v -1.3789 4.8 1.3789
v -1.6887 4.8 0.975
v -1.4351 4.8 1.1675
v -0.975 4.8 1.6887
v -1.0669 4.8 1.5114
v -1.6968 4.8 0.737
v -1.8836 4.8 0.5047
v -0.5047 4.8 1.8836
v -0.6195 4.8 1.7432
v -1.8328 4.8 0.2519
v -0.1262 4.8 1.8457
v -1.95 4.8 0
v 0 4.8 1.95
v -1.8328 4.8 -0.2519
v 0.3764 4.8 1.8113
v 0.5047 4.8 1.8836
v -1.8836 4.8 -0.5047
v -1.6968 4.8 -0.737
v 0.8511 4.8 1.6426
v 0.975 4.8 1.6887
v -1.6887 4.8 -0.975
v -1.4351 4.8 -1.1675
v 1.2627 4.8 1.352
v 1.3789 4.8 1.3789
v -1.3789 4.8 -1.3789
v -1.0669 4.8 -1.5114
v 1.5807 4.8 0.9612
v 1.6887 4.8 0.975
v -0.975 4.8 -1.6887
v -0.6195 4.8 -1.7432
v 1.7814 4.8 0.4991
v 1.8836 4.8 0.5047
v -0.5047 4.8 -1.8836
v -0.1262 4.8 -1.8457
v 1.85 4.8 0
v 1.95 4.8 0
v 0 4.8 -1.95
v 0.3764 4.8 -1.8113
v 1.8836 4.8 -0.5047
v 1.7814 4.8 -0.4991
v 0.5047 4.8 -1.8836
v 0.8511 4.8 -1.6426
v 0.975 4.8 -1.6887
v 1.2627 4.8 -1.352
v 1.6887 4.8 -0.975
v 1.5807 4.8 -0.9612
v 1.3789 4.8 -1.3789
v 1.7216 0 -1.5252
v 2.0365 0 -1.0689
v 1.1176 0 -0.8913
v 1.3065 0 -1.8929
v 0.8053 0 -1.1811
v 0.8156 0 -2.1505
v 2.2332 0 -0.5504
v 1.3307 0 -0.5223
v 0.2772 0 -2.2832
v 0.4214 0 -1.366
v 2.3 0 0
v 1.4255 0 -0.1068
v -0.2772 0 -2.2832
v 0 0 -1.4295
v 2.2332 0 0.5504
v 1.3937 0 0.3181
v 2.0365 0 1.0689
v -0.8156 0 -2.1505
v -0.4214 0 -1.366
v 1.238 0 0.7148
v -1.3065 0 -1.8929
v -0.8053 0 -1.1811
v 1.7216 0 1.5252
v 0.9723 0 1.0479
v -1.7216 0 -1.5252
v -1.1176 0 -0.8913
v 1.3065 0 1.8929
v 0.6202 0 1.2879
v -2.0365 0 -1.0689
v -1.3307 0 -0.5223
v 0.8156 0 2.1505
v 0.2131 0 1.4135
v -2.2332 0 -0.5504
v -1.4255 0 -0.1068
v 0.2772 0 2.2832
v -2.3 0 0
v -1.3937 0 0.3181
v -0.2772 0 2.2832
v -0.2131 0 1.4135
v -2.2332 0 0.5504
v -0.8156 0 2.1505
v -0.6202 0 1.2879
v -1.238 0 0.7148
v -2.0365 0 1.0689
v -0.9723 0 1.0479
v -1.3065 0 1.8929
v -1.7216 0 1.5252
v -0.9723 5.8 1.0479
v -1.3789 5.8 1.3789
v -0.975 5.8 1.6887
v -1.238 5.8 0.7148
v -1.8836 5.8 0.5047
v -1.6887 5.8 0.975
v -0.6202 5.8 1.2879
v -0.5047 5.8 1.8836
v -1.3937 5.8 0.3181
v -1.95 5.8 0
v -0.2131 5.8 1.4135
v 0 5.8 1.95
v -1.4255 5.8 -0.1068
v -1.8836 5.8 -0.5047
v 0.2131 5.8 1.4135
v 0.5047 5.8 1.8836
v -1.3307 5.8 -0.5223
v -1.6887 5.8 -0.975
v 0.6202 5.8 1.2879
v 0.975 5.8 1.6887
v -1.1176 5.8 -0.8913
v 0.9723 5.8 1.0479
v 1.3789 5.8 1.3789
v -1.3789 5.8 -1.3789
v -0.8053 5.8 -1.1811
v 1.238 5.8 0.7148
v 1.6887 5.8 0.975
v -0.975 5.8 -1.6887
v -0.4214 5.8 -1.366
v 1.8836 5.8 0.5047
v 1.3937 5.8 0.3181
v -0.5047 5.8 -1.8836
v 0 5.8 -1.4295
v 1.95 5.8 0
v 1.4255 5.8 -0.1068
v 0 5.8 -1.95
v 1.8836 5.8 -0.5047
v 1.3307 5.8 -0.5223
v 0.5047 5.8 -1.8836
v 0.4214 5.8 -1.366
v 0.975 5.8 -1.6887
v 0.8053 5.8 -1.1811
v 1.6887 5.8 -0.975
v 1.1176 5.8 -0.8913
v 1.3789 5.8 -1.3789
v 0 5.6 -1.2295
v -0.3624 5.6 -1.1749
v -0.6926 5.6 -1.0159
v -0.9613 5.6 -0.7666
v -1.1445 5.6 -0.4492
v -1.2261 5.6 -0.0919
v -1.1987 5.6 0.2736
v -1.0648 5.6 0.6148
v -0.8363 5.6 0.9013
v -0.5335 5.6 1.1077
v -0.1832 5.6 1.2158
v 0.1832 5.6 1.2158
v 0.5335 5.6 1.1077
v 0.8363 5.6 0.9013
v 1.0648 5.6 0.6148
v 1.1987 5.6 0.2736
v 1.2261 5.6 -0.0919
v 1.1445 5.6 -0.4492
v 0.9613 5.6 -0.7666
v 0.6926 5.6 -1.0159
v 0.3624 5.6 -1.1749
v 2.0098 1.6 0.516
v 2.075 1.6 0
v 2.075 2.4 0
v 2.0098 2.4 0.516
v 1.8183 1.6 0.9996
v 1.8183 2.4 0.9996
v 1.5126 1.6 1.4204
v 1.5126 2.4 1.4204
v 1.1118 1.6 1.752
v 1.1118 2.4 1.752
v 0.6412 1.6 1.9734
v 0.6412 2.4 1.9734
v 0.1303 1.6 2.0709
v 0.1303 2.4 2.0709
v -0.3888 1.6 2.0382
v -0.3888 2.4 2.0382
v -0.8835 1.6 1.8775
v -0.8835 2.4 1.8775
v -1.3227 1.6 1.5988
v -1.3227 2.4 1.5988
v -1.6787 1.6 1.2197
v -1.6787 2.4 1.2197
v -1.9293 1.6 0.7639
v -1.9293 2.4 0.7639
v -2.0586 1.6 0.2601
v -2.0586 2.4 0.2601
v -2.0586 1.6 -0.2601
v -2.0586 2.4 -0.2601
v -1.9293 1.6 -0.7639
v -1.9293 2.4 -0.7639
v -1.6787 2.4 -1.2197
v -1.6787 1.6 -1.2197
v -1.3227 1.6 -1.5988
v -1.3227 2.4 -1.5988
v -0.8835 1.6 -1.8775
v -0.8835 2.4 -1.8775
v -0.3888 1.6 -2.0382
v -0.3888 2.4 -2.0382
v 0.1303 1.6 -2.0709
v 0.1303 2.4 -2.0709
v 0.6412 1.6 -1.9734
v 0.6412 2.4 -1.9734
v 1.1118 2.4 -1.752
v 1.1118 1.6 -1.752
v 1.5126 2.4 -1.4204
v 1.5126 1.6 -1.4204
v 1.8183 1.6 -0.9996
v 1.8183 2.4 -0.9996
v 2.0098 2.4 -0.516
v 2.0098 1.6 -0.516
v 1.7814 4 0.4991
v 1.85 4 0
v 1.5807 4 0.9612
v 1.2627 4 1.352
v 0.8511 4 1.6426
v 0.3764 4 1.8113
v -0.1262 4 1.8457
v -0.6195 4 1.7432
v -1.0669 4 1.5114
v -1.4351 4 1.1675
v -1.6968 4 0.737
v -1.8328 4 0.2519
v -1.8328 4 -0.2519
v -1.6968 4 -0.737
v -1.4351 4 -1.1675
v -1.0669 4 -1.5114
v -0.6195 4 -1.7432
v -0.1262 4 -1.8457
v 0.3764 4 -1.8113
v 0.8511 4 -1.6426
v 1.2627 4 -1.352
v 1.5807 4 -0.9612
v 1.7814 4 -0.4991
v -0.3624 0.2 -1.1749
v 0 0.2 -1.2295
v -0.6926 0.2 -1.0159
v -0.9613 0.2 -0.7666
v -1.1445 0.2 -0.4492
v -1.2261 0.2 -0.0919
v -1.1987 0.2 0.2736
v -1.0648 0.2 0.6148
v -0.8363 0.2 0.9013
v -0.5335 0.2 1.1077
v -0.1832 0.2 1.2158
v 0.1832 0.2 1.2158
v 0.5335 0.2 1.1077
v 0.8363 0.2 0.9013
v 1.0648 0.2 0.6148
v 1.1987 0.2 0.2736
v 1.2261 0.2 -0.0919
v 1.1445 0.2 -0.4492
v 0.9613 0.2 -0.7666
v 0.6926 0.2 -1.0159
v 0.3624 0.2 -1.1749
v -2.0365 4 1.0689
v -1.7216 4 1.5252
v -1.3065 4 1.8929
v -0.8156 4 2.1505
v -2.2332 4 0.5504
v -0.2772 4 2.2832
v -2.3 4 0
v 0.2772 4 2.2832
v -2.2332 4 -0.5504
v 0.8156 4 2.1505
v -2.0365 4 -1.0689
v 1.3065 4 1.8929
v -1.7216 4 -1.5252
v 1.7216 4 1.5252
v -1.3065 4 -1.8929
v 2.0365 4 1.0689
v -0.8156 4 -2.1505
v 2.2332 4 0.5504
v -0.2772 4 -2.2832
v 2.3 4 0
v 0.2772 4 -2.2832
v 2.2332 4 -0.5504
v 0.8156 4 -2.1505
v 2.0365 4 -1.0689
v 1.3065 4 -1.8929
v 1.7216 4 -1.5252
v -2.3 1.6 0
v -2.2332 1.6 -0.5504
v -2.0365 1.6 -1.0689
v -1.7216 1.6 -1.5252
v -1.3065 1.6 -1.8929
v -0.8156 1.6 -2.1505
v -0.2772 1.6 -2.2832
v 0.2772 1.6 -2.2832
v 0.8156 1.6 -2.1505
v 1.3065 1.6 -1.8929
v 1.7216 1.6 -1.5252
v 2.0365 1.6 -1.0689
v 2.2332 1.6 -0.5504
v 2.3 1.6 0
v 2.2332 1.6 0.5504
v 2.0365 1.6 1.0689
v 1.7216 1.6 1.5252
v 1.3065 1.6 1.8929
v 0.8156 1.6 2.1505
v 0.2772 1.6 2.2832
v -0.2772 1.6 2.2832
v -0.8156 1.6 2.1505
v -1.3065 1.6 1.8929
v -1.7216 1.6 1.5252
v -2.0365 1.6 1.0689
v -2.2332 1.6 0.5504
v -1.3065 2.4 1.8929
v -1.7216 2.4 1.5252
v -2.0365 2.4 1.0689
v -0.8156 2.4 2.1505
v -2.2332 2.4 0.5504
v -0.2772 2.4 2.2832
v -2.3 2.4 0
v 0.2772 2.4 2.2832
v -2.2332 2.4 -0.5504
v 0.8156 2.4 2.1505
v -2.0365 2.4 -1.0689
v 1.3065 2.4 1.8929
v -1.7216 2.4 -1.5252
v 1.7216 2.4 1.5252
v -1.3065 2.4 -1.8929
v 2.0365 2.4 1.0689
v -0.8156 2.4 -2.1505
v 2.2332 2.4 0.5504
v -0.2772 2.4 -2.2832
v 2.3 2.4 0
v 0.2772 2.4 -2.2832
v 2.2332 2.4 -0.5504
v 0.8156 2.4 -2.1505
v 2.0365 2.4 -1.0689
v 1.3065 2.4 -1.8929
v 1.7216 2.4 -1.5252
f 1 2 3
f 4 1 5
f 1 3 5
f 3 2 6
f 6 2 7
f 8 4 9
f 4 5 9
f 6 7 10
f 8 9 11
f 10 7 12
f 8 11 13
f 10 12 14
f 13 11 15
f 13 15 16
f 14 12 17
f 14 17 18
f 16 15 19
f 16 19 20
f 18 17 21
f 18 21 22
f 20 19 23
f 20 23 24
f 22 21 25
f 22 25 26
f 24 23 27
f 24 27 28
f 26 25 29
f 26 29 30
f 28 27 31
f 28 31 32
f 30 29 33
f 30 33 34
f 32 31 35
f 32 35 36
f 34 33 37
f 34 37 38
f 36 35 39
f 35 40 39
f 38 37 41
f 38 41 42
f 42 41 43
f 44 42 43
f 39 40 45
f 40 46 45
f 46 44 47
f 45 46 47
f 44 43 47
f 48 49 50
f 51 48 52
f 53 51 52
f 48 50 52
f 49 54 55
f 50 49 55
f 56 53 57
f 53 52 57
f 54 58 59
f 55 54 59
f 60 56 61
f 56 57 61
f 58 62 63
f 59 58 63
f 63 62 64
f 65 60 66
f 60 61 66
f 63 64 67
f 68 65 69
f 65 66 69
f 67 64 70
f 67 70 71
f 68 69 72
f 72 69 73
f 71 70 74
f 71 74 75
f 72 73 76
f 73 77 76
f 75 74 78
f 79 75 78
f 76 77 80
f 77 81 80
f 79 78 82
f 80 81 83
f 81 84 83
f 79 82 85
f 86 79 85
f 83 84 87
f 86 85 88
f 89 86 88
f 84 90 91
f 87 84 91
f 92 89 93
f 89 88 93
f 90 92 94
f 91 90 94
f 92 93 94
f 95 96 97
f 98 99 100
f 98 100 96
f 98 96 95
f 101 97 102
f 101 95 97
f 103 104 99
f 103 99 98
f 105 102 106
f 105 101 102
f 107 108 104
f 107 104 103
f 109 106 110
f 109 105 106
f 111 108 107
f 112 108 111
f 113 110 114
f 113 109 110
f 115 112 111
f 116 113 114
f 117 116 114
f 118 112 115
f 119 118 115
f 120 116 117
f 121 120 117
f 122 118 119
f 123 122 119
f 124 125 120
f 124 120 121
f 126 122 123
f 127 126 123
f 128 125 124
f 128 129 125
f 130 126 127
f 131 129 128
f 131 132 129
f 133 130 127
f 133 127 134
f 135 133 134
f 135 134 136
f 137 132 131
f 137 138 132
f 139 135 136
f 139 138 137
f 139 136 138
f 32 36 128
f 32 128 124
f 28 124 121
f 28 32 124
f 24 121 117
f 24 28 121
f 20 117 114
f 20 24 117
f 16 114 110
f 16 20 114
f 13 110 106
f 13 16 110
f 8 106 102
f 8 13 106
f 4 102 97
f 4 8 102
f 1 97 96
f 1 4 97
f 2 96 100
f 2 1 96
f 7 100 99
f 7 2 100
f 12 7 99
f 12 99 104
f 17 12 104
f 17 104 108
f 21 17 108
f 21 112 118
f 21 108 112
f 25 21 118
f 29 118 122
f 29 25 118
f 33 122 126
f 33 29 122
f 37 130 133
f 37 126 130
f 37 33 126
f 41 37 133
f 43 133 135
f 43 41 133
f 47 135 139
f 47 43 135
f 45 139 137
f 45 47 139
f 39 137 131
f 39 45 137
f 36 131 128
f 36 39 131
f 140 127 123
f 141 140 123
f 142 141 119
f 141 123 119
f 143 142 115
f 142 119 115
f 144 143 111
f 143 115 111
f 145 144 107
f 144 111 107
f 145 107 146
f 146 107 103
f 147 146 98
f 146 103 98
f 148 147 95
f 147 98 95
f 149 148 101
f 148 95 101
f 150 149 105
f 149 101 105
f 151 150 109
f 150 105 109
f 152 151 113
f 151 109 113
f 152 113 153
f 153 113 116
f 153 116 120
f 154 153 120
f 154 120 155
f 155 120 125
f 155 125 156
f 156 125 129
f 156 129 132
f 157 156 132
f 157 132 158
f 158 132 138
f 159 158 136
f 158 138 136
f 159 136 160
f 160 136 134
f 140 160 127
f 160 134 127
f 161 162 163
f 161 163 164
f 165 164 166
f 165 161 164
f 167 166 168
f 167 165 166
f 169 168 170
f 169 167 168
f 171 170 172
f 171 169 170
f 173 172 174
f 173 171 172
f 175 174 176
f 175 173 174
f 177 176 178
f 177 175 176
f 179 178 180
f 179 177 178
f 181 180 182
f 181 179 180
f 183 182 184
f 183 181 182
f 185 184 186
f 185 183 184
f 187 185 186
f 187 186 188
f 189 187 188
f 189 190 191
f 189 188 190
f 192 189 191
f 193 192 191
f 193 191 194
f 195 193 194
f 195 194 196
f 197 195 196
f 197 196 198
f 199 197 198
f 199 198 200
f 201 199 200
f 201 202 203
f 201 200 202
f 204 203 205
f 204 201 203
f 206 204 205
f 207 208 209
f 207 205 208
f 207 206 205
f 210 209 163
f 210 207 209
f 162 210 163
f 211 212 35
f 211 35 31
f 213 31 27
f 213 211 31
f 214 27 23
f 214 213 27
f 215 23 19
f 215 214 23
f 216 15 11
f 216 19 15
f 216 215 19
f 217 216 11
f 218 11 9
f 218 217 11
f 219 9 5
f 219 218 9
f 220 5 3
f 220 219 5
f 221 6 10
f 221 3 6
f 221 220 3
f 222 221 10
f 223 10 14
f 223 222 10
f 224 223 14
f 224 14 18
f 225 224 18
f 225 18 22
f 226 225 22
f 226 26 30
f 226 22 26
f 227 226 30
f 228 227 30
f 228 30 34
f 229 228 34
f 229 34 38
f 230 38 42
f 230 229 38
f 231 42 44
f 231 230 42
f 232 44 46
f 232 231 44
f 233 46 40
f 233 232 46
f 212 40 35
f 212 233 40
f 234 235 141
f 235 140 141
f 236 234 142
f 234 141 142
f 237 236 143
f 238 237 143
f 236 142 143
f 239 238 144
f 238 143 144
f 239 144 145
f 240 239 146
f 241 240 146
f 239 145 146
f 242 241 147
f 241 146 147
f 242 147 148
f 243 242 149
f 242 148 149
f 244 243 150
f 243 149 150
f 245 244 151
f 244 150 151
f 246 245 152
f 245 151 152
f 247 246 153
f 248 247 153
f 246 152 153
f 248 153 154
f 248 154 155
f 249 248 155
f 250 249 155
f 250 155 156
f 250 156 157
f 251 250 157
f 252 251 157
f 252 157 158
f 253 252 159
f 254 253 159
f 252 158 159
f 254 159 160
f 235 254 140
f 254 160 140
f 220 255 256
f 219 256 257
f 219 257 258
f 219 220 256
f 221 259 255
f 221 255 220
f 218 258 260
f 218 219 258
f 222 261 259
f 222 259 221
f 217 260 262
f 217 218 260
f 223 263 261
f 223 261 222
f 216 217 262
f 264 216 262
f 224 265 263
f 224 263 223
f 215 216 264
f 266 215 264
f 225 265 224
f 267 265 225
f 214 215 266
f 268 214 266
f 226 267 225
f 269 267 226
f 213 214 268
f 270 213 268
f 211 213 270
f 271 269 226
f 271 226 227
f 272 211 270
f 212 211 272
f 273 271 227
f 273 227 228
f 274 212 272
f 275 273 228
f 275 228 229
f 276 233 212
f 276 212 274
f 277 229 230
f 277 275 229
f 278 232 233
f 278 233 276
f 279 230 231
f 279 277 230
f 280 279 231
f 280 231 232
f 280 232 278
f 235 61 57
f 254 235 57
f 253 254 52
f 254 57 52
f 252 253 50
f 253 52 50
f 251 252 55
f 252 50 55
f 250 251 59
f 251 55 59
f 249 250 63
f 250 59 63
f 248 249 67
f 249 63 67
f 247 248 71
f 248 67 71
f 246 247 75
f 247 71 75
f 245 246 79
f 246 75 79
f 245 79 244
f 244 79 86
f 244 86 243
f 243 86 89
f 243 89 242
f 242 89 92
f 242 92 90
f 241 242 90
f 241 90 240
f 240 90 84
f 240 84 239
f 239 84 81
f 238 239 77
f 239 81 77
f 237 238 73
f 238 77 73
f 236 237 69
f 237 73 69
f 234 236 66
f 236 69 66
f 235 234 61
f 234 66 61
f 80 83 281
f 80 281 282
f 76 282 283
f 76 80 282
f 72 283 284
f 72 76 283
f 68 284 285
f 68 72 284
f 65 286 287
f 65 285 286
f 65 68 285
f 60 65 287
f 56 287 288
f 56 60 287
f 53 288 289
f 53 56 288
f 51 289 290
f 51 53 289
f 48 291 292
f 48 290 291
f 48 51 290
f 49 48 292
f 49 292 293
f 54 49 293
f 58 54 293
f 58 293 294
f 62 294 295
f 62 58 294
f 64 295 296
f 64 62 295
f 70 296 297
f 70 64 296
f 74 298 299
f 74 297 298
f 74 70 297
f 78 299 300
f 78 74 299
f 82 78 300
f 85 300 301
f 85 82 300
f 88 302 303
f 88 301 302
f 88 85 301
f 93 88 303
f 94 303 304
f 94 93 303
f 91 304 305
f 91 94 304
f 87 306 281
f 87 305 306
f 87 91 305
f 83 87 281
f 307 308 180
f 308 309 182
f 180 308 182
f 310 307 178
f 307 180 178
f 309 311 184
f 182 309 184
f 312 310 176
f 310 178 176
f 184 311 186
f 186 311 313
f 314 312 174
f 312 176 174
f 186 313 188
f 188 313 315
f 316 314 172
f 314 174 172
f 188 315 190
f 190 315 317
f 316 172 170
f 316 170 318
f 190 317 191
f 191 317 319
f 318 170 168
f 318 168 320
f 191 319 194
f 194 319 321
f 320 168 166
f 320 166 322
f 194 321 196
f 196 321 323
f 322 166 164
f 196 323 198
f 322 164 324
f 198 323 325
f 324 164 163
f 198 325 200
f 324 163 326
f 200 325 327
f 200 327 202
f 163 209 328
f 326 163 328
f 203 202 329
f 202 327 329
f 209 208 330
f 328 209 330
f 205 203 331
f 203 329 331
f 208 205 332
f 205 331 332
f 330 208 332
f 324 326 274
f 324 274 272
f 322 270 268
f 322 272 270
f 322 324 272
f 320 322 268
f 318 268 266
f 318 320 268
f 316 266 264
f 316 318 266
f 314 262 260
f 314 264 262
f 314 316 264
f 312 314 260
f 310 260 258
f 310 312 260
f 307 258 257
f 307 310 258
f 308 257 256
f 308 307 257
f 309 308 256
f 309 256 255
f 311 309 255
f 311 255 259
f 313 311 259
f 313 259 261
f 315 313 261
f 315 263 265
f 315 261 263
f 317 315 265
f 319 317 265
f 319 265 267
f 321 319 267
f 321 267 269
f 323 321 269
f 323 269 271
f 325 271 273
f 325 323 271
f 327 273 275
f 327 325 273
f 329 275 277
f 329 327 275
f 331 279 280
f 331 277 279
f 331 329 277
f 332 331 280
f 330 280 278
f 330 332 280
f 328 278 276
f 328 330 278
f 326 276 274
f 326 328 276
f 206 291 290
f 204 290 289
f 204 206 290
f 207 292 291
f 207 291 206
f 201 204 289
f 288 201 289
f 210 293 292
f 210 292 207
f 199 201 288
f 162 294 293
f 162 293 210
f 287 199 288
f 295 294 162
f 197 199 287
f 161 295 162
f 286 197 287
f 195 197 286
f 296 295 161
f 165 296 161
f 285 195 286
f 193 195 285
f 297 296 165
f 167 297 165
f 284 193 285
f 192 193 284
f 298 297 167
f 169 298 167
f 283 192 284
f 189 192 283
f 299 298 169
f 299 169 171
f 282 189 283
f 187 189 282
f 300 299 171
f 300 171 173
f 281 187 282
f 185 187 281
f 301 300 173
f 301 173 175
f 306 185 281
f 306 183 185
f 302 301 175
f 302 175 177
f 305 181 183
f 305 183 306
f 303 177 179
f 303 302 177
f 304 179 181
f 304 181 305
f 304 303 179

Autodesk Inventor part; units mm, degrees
ref_plane "YZ Plane" through (0, 0, 0) normal (1, 0, 0) x (0, 1, 0)
ref_plane "XZ Plane" through (0, 0, 0) normal (0, 1, 0) x (-1, 0, 0)
ref_plane "XY Plane" through (0, 0, 0) normal (0, 0, 1) x (1, 0, 0)
sketch "Sketch1" plane through (0, 0, 0) normal (0, 1, 0) x (-1, 0, 0)
  circle A0 centre (0, 0) radius 2.3
  dimension "d0" = 4.6
extrude "Extrusion1" add sketch "Sketch1" along normal blind 1.6
sketch "Sketch2" plane through (0, 1.6, 0) normal (0, 1, 0) x (1, 0, 0)
  circle A0 centre (0, 0) radius 2.075
  dimension "d3" = 4.15
extrude "Extrusion2" add sketch "Sketch2" along normal blind 0.8
sketch "Sketch3" plane through (0, 2.4, 0) normal (0, 1, 0) x (1, 0, 0)
  circle A0 centre (0, 0) radius 2.3 projected
extrude "Extrusion3" add sketch "Sketch3" along normal blind 1.6
sketch "Sketch4" plane through (0, 4, 0) normal (0, 1, 0) x (1, 0, 0)
  circle A0 centre (0, 0) radius 1.85
  dimension "d8" = 3.7
extrude "Extrusion4" add sketch "Sketch4" along normal blind 0.8
sketch "Sketch5" plane through (0, 4.8, 0) normal (0, 1, 0) x (1, 0, 0)
  circle A0 centre (0, 0) radius 1.95
  dimension "d11" = 3.9
extrude "Extrusion5" add sketch "Sketch5" along normal blind 1
hole "Hole1" at (0, 0, 0) direction (0, 1, 0) diameter 2.459 end through all thread size "M3x0.5" class "6H" standard "ISO Metric profile"
chamfer "Chamfer1" distance 0.2 angle 45 2 edges at (0, 0, 1.2295) (0, 5.8, 1.2295)
properties part number "COTS_BOSSARD_1386867_M3_Insert"
